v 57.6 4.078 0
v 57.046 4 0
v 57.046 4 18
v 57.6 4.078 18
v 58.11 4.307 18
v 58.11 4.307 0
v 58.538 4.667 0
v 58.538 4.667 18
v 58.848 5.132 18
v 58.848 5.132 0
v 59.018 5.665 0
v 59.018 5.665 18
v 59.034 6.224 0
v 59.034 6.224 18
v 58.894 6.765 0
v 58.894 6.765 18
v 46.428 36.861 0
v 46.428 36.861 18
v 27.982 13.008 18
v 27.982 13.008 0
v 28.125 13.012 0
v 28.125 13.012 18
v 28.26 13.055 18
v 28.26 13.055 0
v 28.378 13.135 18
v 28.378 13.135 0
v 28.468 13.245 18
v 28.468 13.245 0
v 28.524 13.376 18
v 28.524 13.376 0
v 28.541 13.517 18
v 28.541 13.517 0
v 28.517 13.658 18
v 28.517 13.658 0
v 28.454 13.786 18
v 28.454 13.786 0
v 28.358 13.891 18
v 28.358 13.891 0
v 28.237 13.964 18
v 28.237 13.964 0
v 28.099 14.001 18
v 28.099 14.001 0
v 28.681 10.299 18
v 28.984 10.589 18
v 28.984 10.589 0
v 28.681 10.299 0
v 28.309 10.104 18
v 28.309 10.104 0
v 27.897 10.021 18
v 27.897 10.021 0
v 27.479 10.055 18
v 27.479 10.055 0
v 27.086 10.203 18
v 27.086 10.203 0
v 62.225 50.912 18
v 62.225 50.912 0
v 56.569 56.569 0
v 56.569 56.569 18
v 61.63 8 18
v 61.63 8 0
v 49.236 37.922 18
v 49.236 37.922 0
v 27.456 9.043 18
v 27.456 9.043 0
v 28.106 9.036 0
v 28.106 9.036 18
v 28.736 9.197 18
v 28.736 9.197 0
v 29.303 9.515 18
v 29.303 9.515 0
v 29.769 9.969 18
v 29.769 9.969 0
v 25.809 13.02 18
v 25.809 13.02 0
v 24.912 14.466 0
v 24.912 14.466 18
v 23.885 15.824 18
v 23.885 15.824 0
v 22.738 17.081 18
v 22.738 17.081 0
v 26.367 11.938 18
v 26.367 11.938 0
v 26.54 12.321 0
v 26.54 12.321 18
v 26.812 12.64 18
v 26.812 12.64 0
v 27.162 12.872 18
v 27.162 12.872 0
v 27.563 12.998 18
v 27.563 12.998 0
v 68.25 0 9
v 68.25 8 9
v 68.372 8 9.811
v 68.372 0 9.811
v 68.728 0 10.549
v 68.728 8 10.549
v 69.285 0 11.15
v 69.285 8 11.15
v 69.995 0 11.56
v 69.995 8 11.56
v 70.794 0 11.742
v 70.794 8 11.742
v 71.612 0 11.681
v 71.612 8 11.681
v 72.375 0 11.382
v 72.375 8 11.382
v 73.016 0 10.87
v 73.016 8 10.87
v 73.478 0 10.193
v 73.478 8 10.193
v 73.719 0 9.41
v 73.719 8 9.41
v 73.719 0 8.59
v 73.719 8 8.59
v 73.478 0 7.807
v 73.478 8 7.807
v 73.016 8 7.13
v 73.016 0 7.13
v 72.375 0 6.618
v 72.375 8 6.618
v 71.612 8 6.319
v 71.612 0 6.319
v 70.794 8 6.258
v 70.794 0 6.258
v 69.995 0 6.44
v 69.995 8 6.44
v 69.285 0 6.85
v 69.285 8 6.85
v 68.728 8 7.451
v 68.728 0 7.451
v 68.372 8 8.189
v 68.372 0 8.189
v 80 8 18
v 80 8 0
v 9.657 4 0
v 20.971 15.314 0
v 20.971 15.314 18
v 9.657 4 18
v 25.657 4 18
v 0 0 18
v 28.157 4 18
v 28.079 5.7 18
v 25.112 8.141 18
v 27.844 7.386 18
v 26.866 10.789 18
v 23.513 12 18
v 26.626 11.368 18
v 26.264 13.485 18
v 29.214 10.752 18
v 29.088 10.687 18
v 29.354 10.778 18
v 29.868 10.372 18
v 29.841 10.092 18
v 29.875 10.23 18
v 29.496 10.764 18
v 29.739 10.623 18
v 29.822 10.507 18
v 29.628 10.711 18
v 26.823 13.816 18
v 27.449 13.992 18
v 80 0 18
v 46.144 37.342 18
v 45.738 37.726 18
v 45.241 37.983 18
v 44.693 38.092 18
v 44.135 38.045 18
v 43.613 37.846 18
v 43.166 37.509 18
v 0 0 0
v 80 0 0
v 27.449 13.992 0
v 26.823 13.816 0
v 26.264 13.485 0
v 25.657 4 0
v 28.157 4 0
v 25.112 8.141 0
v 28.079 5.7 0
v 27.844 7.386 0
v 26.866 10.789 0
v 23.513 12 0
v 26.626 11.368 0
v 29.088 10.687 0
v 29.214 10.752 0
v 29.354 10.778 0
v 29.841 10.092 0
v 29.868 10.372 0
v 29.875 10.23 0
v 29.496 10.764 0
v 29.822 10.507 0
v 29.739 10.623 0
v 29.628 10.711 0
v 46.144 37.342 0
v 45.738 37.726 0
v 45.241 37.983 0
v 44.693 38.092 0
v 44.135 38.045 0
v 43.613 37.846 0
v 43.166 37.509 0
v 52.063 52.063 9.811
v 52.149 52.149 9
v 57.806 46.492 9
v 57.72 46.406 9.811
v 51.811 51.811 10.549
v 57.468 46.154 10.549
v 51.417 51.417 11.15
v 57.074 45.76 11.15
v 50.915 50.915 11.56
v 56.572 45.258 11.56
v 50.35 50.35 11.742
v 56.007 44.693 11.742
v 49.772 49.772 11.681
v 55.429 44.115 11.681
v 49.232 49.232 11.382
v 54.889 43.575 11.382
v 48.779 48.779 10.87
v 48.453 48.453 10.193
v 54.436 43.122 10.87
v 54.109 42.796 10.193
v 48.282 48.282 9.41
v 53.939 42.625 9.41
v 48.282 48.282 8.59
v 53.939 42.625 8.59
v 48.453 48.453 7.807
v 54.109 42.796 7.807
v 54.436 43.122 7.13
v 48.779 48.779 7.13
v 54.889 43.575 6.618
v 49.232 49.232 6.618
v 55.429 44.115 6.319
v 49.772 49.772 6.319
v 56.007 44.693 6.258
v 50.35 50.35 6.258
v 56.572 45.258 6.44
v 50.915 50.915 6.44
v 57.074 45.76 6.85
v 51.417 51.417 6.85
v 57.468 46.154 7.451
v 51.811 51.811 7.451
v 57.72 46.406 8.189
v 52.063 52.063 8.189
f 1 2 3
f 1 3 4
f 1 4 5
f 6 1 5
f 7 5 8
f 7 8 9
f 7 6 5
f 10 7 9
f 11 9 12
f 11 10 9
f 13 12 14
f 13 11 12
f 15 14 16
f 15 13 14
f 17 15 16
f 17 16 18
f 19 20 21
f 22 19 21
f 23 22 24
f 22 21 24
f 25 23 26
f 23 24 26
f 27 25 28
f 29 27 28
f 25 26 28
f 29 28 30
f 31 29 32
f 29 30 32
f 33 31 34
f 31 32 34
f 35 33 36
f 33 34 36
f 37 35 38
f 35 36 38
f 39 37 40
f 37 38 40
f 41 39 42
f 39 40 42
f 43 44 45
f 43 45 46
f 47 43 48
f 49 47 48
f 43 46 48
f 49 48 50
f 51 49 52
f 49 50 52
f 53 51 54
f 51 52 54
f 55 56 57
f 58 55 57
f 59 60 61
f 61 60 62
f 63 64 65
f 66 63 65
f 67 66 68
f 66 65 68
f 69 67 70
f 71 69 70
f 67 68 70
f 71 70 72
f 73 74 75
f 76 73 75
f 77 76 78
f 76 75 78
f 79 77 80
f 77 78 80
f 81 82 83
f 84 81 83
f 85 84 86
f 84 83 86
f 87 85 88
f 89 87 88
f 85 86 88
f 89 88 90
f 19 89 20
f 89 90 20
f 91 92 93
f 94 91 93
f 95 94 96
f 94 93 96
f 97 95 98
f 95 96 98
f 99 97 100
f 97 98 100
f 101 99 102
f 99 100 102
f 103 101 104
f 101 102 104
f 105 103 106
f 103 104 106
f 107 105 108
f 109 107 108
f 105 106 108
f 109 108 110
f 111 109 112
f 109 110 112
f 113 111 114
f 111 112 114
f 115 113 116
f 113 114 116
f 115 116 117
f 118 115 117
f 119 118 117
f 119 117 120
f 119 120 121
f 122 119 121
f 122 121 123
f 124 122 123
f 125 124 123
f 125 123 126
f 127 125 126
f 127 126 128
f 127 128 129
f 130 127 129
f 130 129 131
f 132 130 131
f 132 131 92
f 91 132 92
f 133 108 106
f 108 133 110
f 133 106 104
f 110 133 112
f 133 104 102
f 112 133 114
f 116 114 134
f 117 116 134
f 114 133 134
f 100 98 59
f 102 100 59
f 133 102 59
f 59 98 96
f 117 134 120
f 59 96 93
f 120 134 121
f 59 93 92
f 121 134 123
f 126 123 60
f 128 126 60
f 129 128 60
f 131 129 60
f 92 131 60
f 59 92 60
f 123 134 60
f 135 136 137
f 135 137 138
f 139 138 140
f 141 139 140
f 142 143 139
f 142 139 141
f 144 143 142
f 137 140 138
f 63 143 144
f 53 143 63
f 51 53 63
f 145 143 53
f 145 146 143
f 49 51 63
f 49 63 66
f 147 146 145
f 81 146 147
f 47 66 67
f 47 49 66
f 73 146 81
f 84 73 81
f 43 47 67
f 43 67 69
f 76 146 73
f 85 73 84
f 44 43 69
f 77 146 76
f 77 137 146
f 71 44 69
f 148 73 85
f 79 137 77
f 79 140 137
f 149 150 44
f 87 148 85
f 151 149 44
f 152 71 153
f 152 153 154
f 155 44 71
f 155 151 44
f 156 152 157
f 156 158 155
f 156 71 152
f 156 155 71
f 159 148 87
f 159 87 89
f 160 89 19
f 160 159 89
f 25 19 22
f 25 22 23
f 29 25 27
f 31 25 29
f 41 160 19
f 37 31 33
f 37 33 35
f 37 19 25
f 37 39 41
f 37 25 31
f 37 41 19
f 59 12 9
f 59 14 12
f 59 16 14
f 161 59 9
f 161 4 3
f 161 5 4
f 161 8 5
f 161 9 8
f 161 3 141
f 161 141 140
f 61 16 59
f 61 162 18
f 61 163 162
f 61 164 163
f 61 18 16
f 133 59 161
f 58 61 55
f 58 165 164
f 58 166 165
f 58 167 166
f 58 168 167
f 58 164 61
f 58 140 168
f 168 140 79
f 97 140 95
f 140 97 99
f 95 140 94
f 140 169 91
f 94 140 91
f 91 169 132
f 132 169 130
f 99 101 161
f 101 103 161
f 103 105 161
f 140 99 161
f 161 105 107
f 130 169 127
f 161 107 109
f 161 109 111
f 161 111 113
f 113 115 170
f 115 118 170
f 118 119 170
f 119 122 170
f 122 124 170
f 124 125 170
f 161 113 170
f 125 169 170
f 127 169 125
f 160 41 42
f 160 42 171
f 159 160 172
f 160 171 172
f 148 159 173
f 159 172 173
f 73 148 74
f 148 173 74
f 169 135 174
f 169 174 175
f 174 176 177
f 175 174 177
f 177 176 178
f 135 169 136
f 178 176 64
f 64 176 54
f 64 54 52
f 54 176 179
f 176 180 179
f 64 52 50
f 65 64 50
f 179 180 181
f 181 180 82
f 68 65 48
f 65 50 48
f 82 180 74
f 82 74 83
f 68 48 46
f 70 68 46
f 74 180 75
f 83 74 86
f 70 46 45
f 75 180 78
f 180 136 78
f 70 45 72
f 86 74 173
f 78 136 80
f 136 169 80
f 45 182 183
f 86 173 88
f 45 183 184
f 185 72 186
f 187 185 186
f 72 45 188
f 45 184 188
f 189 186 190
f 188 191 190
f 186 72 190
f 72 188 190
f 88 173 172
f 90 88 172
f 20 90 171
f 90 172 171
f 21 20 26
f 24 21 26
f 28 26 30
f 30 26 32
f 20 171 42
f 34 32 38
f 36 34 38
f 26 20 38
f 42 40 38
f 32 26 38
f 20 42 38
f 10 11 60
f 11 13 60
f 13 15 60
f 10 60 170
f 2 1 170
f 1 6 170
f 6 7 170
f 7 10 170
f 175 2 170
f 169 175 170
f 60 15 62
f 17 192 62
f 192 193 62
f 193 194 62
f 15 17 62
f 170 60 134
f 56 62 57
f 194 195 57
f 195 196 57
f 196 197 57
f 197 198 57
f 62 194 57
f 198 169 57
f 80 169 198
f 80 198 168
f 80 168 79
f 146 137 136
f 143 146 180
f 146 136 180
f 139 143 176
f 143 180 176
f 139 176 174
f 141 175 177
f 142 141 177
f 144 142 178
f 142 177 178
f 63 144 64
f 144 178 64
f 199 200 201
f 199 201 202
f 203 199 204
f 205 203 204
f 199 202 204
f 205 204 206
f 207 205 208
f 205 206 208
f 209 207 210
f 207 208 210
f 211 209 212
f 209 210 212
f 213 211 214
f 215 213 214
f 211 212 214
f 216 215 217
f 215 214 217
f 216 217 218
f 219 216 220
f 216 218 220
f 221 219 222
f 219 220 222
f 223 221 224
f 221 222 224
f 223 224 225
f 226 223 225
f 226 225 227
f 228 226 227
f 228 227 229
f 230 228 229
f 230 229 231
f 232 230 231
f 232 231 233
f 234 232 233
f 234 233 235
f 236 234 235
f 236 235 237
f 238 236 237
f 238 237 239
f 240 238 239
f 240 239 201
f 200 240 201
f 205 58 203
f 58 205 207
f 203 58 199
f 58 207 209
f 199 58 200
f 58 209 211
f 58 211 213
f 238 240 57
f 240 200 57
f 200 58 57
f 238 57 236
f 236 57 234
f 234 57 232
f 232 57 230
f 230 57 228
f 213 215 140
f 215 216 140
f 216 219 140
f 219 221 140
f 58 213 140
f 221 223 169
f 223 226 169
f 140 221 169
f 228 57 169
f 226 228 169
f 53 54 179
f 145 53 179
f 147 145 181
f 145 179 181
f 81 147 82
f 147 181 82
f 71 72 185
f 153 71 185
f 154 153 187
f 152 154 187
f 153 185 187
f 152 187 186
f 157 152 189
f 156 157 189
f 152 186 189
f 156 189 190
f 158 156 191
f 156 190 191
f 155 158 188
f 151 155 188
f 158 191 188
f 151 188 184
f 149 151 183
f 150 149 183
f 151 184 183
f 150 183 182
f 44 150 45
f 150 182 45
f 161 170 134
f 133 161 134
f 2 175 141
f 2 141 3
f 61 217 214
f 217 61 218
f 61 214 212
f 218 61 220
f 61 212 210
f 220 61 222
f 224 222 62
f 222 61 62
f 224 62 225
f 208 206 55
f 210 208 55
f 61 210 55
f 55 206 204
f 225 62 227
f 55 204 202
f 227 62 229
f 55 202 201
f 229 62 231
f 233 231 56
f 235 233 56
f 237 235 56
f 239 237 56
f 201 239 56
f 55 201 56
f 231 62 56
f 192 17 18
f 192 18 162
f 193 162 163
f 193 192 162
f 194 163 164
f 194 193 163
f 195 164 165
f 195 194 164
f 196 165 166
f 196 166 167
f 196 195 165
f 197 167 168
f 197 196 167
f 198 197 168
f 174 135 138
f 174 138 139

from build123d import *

# Parameters (mm, degrees)
EXTRUDE_1_DEPTH     = 18
SKETCH_2_R          = 2.75
CUT_EXTRUDE_1_DEPTH = 28
SKETCH_3_R          = 2.75
CUT_EXTRUDE_2_DEPTH = 28


with BuildPart() as part:
    # 草图1 → 凸台-拉伸1 (new body)
    # profile 1 of 2: a face of its own
    with BuildSketch(Plane.XY):
        Polygon((80, 0), (80, 8), (61.629823519, 8), (49.235720383, 37.922011884), (62.225396744, 50.911688245), (56.568542495, 56.568542495), (0, 0), align=None)
        with BuildLine():
            ThreePointArc((46.428217999, 36.860544425), (44.970639578, 38.056748121), (43.166245372, 37.509391123))
            Line((43.166245372, 37.509391123), (9.656854249, 4))
            Line((9.656854249, 4), (57.046289642, 4))
            ThreePointArc((57.046289642, 4), (58.709228866, 4.888859534), (58.894048707, 6.765366865))
            Line((58.894048707, 6.765366865), (46.428217999, 36.860544425))
        make_face(mode=Mode.SUBTRACT)
    # profile 2 of 2: a face of its own
    with BuildSketch(Plane.XY):
        with BuildLine():
            Line((25.656854249, 4), (28.156854249, 4))
            ThreePointArc((28.156854249, 4), (27.980871323, 6.54566264), (27.456270652, 9.042893586))
            ThreePointArc((27.456270652, 9.042893586), (28.736340858, 9.197193956), (29.769286429, 9.968823258))
            ThreePointArc((29.769286429, 9.968823258), (29.686739249, 10.671095259), (28.984467248, 10.588548079))
            ThreePointArc((28.984467248, 10.588548079), (28.105812081, 10.048151022), (27.085956296, 10.202934937))
            ThreePointArc((27.085956296, 10.202934937), (26.748625601, 11.079643499), (26.367227854, 11.93809889))
            ThreePointArc((26.367227854, 11.93809889), (26.978926039, 12.768694587), (27.982347489, 13.007879191))
            ThreePointArc((27.982347489, 13.007879191), (28.537298455, 13.446090814), (28.099086832, 14.001041779))
            ThreePointArc((28.099086832, 14.001041779), (26.823059701, 13.816263273), (25.808806541, 13.020223788))
            ThreePointArc((25.808806541, 13.020223788), (24.413946296, 15.156981417), (22.738329701, 17.081475452))
            Line((22.738329701, 17.081475452), (20.970562748, 15.313708499))
            ThreePointArc((20.970562748, 15.313708499), (24.43892677, 10.122934918), (25.656854249, 4))
        make_face()
    extrude(amount=EXTRUDE_1_DEPTH)

    # 草图2 → 切除-拉伸1 (cut)
    with BuildSketch(Plane(origin=(0, 8, 0), x_dir=(1, 0, 0), z_dir=(0, 1, 0))):
        with Locations(Location((71, -9, 0), (0, 0, 180))):
            Circle(SKETCH_2_R)
    extrude(amount=-CUT_EXTRUDE_1_DEPTH, mode=Mode.SUBTRACT)

    # 草图3 → 切除-拉伸2 (cut)
    with BuildSketch(Plane(origin=(5.656854249, -5.656854249, 0), x_dir=(0, 0, -1), z_dir=(0.7071067811865488, -0.7071067811865464, 0))):
        with Locations(Location((-9, 71, 0), (0, 0, 90))):
            Circle(SKETCH_3_R)
    extrude(amount=-CUT_EXTRUDE_2_DEPTH, mode=Mode.SUBTRACT)


solid = part.part
